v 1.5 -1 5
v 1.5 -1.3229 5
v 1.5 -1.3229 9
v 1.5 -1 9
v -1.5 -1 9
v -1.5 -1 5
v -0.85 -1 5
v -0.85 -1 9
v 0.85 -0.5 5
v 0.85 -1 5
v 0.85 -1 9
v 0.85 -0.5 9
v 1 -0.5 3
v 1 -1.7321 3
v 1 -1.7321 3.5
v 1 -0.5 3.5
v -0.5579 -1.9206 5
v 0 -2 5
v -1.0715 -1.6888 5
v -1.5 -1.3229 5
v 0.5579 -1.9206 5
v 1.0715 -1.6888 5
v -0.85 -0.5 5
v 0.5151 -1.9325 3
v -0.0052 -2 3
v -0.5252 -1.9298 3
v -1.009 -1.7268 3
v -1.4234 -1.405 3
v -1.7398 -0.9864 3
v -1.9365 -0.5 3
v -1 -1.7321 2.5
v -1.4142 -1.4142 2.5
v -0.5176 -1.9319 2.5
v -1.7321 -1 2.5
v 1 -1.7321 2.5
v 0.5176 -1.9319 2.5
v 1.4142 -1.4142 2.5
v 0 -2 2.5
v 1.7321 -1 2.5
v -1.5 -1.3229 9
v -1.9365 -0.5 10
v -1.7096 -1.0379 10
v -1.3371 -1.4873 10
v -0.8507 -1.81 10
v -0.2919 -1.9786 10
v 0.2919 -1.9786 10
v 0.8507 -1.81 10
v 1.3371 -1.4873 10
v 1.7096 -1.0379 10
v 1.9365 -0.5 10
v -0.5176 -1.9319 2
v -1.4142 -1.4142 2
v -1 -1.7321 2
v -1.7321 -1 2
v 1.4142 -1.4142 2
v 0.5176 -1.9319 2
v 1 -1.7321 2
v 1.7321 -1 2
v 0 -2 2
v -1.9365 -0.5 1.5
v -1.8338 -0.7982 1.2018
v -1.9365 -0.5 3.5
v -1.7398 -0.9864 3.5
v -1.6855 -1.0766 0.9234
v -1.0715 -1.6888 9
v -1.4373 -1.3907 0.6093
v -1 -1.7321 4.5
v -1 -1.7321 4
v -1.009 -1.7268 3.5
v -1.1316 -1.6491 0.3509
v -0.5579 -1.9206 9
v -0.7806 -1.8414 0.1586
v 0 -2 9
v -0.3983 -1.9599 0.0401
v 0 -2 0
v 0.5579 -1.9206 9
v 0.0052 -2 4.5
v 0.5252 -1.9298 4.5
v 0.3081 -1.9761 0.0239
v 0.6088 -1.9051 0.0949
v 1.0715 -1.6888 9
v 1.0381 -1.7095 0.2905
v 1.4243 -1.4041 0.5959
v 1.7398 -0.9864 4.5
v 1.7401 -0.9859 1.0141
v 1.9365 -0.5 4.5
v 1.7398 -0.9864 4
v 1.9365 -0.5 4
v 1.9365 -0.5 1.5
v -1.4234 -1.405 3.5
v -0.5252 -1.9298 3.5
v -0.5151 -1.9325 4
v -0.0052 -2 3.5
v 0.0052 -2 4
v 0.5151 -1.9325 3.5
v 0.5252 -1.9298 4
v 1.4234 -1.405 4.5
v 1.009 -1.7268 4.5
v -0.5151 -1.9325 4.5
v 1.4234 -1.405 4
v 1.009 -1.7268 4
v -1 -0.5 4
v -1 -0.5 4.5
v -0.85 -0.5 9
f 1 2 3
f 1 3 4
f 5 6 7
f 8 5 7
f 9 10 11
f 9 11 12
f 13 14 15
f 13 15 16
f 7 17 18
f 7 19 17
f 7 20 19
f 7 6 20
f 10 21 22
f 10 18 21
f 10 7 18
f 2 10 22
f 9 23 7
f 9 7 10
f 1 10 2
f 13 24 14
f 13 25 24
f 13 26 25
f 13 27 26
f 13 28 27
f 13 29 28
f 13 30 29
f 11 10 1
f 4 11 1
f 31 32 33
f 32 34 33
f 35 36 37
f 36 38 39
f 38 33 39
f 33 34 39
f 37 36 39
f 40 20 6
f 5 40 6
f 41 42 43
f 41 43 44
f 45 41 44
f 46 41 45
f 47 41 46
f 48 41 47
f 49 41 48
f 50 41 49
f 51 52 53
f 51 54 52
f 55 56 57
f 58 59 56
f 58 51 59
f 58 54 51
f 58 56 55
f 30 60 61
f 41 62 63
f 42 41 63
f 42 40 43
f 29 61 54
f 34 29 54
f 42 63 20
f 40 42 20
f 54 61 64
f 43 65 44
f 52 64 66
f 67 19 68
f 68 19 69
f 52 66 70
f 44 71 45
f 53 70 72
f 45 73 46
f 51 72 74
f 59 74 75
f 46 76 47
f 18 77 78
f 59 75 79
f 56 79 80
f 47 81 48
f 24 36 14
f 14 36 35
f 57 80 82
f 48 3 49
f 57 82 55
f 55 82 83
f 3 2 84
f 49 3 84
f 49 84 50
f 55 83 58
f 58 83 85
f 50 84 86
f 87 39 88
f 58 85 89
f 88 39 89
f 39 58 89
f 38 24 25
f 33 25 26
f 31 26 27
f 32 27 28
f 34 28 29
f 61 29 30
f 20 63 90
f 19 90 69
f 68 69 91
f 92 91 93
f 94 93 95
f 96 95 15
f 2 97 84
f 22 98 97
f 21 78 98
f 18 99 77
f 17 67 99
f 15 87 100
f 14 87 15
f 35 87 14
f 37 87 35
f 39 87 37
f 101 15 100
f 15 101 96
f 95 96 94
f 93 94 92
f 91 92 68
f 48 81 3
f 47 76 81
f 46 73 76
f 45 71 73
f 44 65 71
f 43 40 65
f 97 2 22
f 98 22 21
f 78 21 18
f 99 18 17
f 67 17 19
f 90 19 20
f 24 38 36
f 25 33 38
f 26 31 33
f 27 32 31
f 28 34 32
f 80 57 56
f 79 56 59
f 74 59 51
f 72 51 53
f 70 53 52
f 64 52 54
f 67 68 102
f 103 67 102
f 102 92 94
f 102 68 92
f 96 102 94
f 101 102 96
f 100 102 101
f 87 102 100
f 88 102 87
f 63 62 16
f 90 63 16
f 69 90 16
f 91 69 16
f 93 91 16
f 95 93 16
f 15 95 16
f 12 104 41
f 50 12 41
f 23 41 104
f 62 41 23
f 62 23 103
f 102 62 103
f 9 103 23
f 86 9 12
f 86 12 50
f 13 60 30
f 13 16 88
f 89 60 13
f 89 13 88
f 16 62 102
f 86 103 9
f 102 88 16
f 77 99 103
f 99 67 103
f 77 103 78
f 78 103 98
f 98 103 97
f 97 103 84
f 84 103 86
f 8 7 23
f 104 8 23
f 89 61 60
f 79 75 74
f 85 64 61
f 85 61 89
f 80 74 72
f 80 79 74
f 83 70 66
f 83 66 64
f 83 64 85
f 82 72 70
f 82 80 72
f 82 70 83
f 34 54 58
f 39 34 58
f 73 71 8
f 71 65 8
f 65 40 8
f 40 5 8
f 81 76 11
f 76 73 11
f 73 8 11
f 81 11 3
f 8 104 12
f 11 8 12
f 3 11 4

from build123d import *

# Parameters (mm, degrees)
BOX001_W               = 10
BOX001_H               = 10
BOX001_DEPTH           = 10
BOX001_PLACEMENT_ANGLE = 315
BOX004_W               = 10
BOX004_H               = 10
BOX004_DEPTH           = 0.5
BOX005_W               = 10
BOX005_H               = 10
BOX005_DEPTH           = 0.5
BOX006_W               = 10
BOX006_H               = 10
BOX006_DEPTH           = 0.5
BOX003_W               = 1.7
BOX003_H               = 10
BOX003_DEPTH           = 4
BOX002_W               = 3
BOX002_H               = 3
BOX002_DEPTH           = 4
BOX_W                  = 10
BOX_H                  = 10
BOX_DEPTH              = 10
CYLINDER_R             = 2
CYLINDER_DEPTH         = 10


with BuildPart() as angle_cutter:
    # Box001 → Box001 (new body)
    with BuildSketch(Plane.XY):
        with Locations((5, 5)):
            Rectangle(BOX001_W, BOX001_H)
    extrude(amount=BOX001_DEPTH)


with BuildPart() as angle_cutter_1:
    # Box001 placement: moved
    add(angle_cutter.part.moved(Location((-5, -7.5, -5.5))).rotate(Axis((-5, -7.5, -5.5), (1, 0, 0)), BOX001_PLACEMENT_ANGLE))


with BuildPart() as cube003:
    # Box004 → Box004 (new body)
    with BuildSketch(Plane(origin=(-1, -5, 4), x_dir=(1, 0, 0), z_dir=(0, 0, 1))):
        with Locations((5, 5)):
            Rectangle(BOX004_W, BOX004_H)
    extrude(amount=BOX004_DEPTH)


with BuildPart() as cube004:
    # Box005 → Box005 (new body)
    with BuildSketch(Plane(origin=(-9, -2, 3), x_dir=(1, 0, 0), z_dir=(0, 0, 1))):
        with Locations((5, 5)):
            Rectangle(BOX005_W, BOX005_H)
    extrude(amount=BOX005_DEPTH)


with BuildPart() as fusion001:
    # Box006 → Box006 (new body)
    with BuildSketch(Plane(origin=(-5, -11, 2), x_dir=(1, 0, 0), z_dir=(0, 0, 1))):
        with Locations((5, 5)):
            Rectangle(BOX006_W, BOX006_H)
    extrude(amount=BOX006_DEPTH)

    # Fusion001: union Cube003, Cube004
    add(cube003.part)
    add(cube004.part)


with BuildPart() as cube002:
    # Box003 → Box003 (new body)
    with BuildSketch(Plane(origin=(-0.85, -4, 4), x_dir=(1, 0, 0), z_dir=(0, 0, 1))):
        with Locations((0.85, 5)):
            Rectangle(BOX003_W, BOX003_H)
    extrude(amount=BOX003_DEPTH)


with BuildPart() as fusion:
    # Box002 → Box002 (new body)
    with BuildSketch(Plane(origin=(-1.5, -4, 4), x_dir=(1, 0, 0), z_dir=(0, 0, 1))):
        with Locations((1.5, 1.5)):
            Rectangle(BOX002_W, BOX002_H)
    extrude(amount=BOX002_DEPTH)

    # Fusion: union Cube002
    add(cube002.part)


with BuildPart() as fusion_1:
    # Fusion placement: moved
    add(fusion.part.moved(Location((0, 0, 1))))


with BuildPart() as cube:
    # Box → Box (new body)
    with BuildSketch(Plane(origin=(-5, -0.5, 0), x_dir=(1, 0, 0), z_dir=(0, 0, 1))):
        with Locations((5, 5)):
            Rectangle(BOX_W, BOX_H)
    extrude(amount=BOX_DEPTH)


with BuildPart() as cut003:
    # Cylinder → Cylinder (new body)
    with BuildSketch(Plane.XY):
        Circle(CYLINDER_R)
    extrude(amount=CYLINDER_DEPTH)

    # Cut: cut Cube
    add(cube.part, mode=Mode.SUBTRACT)

    # Cut001: cut Fusion
    add(fusion_1.part, mode=Mode.SUBTRACT)

    # Cut002: cut Fusion001
    add(fusion001.part, mode=Mode.SUBTRACT)

    # Cut003: cut Angle Cutter
    add(angle_cutter_1.part, mode=Mode.SUBTRACT)


solid = cut003.part
